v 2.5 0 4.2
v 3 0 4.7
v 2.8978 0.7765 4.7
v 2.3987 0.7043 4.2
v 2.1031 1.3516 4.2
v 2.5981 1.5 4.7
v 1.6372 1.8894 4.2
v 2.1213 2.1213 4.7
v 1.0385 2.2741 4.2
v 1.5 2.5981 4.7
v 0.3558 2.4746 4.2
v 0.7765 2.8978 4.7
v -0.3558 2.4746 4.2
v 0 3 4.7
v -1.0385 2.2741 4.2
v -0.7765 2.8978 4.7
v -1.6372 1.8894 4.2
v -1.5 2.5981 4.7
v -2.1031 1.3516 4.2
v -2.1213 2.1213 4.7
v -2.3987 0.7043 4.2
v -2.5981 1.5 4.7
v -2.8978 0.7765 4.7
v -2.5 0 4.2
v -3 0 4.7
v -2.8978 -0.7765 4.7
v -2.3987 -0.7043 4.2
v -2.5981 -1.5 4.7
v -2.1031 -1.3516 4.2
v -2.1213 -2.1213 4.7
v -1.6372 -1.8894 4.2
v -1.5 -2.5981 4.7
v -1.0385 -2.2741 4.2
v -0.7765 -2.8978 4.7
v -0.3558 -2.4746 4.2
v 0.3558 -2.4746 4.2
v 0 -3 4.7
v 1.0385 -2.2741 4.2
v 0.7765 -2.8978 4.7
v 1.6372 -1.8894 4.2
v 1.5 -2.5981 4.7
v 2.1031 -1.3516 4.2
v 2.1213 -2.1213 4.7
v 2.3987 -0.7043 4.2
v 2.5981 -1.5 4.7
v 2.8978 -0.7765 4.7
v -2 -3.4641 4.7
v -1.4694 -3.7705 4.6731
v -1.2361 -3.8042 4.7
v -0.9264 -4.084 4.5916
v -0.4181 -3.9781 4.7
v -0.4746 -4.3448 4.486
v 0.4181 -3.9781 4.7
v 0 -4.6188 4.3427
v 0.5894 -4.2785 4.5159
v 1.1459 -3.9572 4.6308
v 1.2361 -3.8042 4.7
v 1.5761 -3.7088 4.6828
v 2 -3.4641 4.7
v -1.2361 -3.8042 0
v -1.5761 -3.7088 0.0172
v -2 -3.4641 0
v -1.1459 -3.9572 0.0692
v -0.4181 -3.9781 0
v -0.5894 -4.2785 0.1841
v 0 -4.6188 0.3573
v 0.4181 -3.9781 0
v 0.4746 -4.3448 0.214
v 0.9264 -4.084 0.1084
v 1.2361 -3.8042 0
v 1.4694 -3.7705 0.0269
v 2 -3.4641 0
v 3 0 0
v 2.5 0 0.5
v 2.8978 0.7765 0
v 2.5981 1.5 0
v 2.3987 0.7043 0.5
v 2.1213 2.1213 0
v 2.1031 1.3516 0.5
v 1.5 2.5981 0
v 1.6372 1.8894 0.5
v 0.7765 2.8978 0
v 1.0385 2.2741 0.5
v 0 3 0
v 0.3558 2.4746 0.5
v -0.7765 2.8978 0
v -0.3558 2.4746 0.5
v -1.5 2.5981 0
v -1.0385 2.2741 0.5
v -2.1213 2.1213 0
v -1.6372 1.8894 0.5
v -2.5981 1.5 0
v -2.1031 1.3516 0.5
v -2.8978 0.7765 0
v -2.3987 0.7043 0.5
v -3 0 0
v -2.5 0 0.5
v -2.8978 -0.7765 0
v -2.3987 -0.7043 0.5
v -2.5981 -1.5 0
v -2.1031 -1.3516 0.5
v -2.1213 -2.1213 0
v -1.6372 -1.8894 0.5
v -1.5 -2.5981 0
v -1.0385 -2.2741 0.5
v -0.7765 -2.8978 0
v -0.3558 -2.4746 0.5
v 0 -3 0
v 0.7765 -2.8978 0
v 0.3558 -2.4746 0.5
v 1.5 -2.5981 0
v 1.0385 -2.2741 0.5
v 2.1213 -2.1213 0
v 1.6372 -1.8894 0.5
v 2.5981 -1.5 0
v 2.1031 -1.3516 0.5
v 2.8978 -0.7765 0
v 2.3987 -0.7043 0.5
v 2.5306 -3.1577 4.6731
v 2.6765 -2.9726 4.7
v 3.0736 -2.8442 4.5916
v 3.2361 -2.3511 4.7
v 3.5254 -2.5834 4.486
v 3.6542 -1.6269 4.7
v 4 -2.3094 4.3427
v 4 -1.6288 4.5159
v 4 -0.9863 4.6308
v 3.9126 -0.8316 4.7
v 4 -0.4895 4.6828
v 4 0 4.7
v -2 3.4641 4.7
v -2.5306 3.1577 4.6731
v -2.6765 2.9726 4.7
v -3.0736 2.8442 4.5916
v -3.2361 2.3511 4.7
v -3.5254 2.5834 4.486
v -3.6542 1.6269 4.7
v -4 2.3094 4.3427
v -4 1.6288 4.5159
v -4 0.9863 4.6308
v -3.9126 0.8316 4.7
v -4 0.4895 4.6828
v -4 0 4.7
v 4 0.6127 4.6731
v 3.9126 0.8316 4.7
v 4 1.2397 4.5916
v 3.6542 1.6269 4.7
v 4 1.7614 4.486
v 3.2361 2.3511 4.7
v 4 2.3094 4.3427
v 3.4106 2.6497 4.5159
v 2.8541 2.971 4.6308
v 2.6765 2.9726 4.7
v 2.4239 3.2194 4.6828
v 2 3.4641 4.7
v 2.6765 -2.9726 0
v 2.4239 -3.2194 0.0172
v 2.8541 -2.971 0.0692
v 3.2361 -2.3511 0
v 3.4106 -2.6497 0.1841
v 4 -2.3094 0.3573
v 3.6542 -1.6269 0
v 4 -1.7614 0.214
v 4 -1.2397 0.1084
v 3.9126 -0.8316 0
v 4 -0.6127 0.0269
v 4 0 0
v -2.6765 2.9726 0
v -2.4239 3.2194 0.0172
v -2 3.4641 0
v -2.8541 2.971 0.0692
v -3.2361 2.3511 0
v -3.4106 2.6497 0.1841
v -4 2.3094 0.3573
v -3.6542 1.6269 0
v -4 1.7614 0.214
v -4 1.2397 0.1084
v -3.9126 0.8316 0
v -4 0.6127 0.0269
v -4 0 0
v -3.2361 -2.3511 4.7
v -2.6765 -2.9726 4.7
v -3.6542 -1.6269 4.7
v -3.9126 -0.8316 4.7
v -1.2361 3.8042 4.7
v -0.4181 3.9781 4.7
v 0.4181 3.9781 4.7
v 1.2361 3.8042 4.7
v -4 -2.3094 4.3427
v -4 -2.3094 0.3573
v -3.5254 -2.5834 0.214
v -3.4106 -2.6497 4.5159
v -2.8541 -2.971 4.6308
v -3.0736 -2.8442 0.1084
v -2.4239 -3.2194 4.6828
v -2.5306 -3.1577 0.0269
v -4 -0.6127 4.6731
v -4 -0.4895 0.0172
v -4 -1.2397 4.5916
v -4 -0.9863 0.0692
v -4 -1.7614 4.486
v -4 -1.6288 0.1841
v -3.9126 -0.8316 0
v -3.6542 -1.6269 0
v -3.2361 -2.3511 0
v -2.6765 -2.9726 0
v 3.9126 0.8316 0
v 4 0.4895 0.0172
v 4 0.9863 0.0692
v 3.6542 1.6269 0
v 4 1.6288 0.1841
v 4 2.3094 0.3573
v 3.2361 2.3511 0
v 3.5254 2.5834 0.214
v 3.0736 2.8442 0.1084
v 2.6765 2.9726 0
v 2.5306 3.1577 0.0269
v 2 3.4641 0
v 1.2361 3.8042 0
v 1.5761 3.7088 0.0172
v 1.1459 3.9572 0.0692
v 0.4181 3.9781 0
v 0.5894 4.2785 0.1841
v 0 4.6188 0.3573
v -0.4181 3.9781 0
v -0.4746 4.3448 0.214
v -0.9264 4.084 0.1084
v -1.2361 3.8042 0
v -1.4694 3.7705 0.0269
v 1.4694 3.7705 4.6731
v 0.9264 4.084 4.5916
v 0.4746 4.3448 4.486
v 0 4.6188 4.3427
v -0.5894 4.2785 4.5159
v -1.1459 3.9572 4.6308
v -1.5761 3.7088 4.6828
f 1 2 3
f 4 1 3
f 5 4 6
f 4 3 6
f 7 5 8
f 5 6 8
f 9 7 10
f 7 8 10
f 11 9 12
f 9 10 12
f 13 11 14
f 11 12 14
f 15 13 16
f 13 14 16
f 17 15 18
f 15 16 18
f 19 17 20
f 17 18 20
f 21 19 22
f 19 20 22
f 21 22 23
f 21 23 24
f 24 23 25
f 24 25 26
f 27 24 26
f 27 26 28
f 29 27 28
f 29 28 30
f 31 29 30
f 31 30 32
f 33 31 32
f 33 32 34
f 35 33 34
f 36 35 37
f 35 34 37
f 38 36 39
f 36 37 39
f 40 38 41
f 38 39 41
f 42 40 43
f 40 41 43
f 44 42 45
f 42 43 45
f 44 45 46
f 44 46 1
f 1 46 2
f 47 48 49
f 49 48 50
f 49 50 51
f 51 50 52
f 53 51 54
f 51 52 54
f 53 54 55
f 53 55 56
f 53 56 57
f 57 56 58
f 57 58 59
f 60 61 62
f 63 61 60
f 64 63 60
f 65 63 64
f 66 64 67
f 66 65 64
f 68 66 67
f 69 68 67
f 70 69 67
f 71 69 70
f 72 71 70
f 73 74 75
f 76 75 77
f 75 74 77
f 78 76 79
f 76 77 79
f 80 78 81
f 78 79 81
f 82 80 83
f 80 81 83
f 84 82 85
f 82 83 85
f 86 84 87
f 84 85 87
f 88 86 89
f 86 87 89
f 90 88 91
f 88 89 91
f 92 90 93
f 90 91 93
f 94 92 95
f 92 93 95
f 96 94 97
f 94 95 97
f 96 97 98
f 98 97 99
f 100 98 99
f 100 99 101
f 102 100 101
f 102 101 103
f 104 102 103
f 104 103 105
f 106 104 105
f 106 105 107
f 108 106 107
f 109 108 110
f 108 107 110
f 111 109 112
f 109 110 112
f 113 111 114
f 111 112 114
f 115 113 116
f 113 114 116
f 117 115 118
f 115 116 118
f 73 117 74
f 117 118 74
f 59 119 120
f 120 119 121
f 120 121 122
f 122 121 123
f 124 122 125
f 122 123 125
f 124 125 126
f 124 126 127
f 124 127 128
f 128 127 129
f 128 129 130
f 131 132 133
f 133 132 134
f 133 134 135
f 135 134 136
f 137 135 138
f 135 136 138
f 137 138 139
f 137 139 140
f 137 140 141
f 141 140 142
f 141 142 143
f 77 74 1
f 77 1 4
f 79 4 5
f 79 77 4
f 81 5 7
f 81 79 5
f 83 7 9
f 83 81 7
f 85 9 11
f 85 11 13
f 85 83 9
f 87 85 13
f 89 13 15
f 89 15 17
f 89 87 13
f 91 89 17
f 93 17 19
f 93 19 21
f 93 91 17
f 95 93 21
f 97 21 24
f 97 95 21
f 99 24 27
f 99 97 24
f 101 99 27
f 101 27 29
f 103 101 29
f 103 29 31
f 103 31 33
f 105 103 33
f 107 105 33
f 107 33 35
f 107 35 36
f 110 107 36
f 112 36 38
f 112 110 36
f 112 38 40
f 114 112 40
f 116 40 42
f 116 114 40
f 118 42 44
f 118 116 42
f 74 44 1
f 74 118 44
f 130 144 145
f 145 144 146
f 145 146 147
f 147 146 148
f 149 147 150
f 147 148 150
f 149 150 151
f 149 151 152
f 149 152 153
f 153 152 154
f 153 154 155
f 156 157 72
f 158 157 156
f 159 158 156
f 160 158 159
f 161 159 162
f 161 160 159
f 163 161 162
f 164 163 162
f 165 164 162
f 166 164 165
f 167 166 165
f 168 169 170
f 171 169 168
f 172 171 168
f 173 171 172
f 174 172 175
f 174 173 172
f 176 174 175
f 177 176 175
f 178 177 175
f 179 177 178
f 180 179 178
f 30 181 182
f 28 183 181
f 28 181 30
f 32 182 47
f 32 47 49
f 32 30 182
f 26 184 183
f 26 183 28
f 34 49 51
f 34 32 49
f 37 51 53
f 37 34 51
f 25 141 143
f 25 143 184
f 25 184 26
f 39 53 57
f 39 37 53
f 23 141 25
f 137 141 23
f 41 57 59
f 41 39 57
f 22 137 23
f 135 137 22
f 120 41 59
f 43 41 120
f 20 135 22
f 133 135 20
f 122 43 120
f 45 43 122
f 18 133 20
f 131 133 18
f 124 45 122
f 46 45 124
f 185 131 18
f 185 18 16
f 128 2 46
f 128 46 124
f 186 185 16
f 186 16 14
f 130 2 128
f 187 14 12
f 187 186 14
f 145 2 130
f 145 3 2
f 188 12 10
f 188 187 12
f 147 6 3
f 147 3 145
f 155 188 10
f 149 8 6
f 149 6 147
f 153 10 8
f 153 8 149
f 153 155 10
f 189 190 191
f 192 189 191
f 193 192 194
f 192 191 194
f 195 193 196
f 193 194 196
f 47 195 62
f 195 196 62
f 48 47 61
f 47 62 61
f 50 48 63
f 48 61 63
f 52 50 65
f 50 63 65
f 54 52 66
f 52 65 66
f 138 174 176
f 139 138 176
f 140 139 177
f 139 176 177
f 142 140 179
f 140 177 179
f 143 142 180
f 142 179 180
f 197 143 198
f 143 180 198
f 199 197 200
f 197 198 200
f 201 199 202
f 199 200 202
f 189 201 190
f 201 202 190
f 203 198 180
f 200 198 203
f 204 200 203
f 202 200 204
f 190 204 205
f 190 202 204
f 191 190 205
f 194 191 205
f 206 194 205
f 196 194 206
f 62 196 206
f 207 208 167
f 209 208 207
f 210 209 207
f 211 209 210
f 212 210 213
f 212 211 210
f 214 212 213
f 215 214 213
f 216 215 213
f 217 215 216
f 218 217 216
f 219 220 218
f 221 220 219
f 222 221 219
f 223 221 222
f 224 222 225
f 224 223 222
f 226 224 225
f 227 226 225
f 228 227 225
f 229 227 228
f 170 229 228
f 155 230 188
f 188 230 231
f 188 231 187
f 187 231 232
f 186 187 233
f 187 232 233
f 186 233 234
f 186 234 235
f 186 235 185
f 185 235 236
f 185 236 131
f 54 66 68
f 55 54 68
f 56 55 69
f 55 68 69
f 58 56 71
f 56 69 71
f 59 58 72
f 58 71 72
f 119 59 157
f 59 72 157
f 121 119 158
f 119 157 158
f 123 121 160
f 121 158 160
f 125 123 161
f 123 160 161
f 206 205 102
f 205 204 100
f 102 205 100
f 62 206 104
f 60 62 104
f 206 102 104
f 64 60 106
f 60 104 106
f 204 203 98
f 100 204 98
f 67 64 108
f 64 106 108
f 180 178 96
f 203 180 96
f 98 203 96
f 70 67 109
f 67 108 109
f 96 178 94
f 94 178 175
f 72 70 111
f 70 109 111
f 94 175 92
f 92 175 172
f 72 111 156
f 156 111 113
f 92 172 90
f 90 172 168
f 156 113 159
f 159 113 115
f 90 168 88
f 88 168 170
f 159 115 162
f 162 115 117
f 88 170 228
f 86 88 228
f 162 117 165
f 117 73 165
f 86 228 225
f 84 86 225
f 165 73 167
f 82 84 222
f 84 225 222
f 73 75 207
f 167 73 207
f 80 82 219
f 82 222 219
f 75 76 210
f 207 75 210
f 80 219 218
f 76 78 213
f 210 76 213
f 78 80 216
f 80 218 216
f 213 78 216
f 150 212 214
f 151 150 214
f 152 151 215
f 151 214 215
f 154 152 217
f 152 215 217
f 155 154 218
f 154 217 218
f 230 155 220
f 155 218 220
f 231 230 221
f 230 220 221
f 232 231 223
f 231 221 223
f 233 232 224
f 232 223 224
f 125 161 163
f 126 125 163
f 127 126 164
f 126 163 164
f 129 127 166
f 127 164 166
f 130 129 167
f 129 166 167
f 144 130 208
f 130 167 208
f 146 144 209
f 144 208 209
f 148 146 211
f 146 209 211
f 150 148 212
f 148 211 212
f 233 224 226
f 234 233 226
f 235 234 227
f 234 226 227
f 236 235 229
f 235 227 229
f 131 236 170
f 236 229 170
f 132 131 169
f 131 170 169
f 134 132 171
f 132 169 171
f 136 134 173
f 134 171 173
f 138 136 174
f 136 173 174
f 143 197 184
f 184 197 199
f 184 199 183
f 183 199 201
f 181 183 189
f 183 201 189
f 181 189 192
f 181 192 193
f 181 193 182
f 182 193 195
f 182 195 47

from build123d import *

# Parameters (mm, degrees)
SKETCH1_R           = 5
SKETCH1_R_2         = 2.5
BOSS_EXTRUDE1_DEPTH = 4.7
CHAMFER1_SIZE       = 1
CHAMFER1_SIZE2      = 0.577350269
CHAMFER2_SIZE       = 1
CHAMFER2_SIZE2      = 0.577350269
SKETCH1_3_R         = 5
CUT_EXTRUDE1_DEPTH  = 9.490583019
CHAMFER3_SIZE       = 0.5


with BuildPart() as part:
    # Sketch1 → Boss-Extrude1 (new body)
    with BuildSketch(Plane.XY):
        Circle(SKETCH1_R)
        Circle(SKETCH1_R_2, mode=Mode.SUBTRACT)
    extrude(amount=BOSS_EXTRUDE1_DEPTH)

    # Chamfer1
    chamfer1_edges = [part.edges().sort_by_distance(p)[0] for p in [
        (-5, 0, 4.7),
    ]]
    chamfer1_side = [part.faces().sort_by_distance(p)[0] for p in [
        (-4.858578644, 0, 4.7),
    ]]
    chamfer(chamfer1_edges, length=CHAMFER1_SIZE, length2=CHAMFER1_SIZE2, reference=chamfer1_side[0])

    # Chamfer2
    chamfer2_edges = [part.edges().sort_by_distance(p)[0] for p in [
        (-5, 0, 0),
    ]]
    chamfer2_side = [part.faces().sort_by_distance(p)[0] for p in [
        (-4.858578644, 0, 0),
    ]]
    chamfer(chamfer2_edges, length=CHAMFER2_SIZE, length2=CHAMFER2_SIZE2, reference=chamfer2_side[0])

    # Sketch1<3> → Cut-Extrude1 (cut, through all)
    with BuildSketch(Plane.XY):
        Circle(SKETCH1_3_R)
        Polygon((-4, 2.309401077), (0, 4.618802154), (4, 2.309401077), (4, -2.309401077), (0, -4.618802154), (-4, -2.309401077), align=None, mode=Mode.SUBTRACT)
    extrude(amount=CUT_EXTRUDE1_DEPTH, mode=Mode.SUBTRACT)

    # Chamfer3
    chamfer3_edges = [part.edges().sort_by_distance(p)[0] for p in [
        (-2.5, 0, 0),
        (-2.5, 0, 4.7),
    ]]
    chamfer(chamfer3_edges, length=CHAMFER3_SIZE)


solid = part.part
